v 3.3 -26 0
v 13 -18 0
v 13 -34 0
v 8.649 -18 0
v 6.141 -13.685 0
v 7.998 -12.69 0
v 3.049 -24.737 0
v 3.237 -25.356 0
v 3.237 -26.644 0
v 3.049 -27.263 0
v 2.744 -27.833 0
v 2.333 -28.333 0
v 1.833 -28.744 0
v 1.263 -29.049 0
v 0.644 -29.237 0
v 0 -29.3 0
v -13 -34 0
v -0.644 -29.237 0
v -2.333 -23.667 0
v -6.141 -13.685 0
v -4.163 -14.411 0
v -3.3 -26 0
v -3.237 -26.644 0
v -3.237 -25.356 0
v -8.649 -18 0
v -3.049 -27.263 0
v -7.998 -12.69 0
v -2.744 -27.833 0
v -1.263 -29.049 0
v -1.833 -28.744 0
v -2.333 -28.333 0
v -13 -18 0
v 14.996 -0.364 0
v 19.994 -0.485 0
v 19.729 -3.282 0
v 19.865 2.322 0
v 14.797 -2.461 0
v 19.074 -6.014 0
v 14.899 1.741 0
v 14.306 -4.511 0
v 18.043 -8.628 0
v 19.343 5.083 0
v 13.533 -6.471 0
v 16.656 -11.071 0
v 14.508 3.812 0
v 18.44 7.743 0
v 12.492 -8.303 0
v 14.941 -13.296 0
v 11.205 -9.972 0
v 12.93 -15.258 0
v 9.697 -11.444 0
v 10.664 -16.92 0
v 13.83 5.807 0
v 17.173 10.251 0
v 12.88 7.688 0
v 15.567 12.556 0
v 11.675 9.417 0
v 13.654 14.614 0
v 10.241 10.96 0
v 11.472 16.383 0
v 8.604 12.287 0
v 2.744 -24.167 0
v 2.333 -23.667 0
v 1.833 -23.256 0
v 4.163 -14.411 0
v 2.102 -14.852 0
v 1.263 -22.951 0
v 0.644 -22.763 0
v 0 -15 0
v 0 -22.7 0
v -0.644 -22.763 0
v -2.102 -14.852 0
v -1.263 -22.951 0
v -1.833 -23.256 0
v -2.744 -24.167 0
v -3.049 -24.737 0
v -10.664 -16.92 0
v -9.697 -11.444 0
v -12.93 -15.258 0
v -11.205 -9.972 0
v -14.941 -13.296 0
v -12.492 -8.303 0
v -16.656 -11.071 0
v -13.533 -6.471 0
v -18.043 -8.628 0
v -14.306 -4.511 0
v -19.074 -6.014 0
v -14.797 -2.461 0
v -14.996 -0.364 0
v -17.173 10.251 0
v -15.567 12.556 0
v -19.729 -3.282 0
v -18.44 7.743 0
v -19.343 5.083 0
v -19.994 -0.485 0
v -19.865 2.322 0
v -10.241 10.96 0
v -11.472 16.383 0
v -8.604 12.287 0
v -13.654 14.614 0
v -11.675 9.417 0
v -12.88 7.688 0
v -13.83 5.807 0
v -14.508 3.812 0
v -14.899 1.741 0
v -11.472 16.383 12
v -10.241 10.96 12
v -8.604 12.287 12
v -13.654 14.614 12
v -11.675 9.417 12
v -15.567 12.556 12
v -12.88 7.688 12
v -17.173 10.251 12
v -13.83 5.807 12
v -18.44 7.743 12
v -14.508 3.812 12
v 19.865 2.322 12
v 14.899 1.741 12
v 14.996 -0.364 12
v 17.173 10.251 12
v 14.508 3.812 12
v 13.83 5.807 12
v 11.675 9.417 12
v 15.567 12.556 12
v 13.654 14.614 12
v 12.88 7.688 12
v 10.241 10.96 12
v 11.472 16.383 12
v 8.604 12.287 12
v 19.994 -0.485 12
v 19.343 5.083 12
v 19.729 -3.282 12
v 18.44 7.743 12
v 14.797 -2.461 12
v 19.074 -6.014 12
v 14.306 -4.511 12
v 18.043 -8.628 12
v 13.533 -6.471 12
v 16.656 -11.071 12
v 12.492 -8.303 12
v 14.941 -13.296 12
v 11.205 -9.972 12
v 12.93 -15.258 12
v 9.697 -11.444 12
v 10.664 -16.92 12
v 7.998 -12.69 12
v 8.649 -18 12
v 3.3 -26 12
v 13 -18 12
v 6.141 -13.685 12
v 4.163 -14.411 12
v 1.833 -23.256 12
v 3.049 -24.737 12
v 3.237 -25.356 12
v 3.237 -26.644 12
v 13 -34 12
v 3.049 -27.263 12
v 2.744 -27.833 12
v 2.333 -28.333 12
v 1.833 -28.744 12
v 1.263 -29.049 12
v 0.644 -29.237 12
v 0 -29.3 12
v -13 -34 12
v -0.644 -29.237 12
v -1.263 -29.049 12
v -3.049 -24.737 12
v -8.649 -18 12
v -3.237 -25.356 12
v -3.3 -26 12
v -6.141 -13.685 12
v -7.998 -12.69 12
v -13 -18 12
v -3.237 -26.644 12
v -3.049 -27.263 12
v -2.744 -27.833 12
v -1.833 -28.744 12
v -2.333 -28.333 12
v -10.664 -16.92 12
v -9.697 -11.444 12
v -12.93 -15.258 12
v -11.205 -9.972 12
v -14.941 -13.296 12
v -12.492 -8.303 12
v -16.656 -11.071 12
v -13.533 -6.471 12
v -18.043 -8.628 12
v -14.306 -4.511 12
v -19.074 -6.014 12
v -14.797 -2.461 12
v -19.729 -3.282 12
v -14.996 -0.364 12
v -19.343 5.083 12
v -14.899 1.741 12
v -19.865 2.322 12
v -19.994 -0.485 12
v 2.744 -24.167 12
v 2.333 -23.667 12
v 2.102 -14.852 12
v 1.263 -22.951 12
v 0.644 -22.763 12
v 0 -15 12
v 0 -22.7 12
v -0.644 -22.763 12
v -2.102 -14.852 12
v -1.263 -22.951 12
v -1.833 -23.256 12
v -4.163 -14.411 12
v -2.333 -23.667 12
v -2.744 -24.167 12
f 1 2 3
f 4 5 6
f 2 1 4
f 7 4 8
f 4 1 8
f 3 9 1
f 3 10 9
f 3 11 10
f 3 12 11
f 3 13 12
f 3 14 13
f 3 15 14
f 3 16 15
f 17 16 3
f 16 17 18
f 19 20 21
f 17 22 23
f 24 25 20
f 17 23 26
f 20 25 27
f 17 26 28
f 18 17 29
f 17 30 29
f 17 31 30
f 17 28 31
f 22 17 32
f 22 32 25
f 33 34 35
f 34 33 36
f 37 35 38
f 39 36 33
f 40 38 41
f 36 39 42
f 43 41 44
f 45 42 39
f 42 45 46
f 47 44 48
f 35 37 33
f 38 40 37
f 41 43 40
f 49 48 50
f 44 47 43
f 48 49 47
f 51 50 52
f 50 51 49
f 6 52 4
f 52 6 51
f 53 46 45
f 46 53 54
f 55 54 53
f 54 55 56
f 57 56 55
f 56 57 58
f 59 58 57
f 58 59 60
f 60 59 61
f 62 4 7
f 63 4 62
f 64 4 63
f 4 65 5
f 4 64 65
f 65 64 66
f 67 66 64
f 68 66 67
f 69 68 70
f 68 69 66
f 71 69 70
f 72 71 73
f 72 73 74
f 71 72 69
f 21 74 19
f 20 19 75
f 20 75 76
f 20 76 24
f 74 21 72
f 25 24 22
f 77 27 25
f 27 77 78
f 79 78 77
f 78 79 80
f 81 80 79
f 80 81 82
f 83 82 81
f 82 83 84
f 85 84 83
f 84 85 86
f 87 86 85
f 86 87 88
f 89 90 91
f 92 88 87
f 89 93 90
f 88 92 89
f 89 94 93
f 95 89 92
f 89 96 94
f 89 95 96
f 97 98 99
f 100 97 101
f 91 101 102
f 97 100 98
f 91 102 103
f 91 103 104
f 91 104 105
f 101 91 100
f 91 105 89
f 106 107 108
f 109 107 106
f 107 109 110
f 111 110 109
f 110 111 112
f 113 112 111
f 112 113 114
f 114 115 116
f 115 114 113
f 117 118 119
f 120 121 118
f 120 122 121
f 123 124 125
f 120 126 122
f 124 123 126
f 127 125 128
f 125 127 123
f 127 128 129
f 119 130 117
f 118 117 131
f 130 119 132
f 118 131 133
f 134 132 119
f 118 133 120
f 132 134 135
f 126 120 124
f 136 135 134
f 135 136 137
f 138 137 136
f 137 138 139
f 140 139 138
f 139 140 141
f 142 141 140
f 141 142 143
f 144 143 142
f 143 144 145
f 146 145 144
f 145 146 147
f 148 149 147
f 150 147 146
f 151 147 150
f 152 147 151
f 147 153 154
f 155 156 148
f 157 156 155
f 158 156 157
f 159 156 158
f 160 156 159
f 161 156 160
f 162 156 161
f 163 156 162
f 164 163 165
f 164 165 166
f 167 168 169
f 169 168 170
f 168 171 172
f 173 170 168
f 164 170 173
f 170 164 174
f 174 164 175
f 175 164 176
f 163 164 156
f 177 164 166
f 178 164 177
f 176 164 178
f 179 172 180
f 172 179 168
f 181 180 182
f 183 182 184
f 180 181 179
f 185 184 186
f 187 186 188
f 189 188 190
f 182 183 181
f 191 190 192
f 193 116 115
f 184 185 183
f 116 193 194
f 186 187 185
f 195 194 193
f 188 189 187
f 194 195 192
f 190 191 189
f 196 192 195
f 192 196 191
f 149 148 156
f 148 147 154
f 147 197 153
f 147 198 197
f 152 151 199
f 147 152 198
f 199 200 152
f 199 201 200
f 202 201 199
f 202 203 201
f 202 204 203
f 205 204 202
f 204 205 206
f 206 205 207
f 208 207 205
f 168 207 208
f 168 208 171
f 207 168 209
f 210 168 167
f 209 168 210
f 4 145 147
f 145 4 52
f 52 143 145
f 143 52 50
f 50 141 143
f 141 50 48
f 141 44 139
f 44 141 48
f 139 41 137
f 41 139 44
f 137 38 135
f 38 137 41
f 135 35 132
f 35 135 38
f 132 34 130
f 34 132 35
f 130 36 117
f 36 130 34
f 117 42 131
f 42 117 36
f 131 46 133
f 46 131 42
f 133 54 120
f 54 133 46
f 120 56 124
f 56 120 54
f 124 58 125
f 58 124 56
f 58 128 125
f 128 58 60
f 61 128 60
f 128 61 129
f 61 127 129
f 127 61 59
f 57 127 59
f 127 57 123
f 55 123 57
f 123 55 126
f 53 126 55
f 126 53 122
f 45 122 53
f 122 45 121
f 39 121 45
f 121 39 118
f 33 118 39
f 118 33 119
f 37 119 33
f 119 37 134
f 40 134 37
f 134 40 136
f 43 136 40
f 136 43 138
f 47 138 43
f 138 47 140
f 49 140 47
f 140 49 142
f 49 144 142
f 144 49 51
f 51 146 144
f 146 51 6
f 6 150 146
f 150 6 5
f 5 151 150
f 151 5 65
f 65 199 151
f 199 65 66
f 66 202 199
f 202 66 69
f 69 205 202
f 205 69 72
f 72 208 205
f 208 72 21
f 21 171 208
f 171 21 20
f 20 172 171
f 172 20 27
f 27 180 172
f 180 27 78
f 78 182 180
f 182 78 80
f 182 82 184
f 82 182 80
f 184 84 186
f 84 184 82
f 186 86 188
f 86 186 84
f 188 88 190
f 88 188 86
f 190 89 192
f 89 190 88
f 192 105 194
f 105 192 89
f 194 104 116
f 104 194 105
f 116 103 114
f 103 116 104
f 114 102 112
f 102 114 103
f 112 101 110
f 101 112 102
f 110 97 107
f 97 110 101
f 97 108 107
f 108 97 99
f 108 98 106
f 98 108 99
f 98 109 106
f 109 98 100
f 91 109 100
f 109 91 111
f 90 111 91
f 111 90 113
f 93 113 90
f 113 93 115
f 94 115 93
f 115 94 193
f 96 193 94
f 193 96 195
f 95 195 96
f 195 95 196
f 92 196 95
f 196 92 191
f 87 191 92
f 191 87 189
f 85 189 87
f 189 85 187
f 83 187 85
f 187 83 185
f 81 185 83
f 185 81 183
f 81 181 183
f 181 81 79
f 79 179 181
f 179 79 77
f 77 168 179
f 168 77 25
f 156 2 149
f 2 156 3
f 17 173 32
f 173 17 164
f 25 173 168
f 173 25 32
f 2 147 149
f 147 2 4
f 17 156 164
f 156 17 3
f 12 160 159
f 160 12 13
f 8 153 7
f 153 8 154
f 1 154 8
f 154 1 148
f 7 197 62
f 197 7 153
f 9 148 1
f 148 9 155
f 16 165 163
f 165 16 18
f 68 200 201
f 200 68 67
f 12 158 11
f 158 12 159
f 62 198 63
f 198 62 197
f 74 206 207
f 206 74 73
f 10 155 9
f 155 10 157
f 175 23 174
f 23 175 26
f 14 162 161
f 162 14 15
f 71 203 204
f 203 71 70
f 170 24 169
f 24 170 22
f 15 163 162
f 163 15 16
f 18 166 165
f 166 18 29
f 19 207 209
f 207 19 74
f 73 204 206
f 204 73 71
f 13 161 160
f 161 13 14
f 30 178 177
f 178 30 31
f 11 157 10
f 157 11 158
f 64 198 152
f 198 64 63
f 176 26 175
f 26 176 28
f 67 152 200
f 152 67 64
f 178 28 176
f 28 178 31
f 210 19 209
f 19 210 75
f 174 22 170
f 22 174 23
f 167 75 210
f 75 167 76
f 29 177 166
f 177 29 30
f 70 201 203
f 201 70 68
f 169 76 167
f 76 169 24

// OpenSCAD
$fn = 32;

// ----------------------------------------------------------------------
// Spring clip: 40 mm outside, 5 mm band, 70 degree opening
// ----------------------------------------------------------------------

// --- parameters (mm) ---
outer_r = 20;             // clip outside radius
inner_r = 15;             // clip bore radius
band = 5;                 // band thickness
clip_w = 12;              // clip width
opening = 70;             // opening angle
tab_w = 26;               // tab width
tab_len = 14;             // tab length past the clip
tab_hole = 6.6;           // tab fixing hole

clip_profile = [[-11.472, 16.383], [-13.654, 14.614], [-15.567, 12.556], [-17.173, 10.251], [-18.44, 7.743], [-19.343, 5.083], [-19.865, 2.322], [-19.994, -0.485], [-19.729, -3.282], [-19.074, -6.014], [-18.043, -8.628], [-16.656, -11.071], [-14.941, -13.296], [-12.93, -15.258], [-10.664, -16.92], [-8.188, -18.247], [-5.55, -19.215], [-2.803, -19.803], [0, -20], [2.803, -19.803], [5.55, -19.215], [8.188, -18.247], [10.664, -16.92], [12.93, -15.258], [14.941, -13.296], [16.656, -11.071], [18.043, -8.628], [19.074, -6.014], [19.729, -3.282], [19.994, -0.485], [19.865, 2.322], [19.343, 5.083], [18.44, 7.743], [17.173, 10.251], [15.567, 12.556], [13.654, 14.614], [11.472, 16.383], [8.604, 12.287], [10.241, 10.96], [11.675, 9.417], [12.88, 7.688], [13.83, 5.807], [14.508, 3.812], [14.899, 1.741], [14.996, -0.364], [14.797, -2.461], [14.306, -4.511], [13.533, -6.471], [12.492, -8.303], [11.205, -9.972], [9.697, -11.444], [7.998, -12.69], [6.141, -13.685], [4.163, -14.411], [2.102, -14.852], [0, -15], [-2.102, -14.852], [-4.163, -14.411], [-6.141, -13.685], [-7.998, -12.69], [-9.697, -11.444], [-11.205, -9.972], [-12.492, -8.303], [-13.533, -6.471], [-14.306, -4.511], [-14.797, -2.461], [-14.996, -0.364], [-14.899, 1.741], [-14.508, 3.812], [-13.83, 5.807], [-12.88, 7.688], [-11.675, 9.417], [-10.241, 10.96], [-8.604, 12.287]];

difference() {
  union() {
    linear_extrude(height = clip_w) polygon(clip_profile);
    /* mounting tab, sunk 2 mm into the band */
    translate([-13, -34, 0]) cube([tab_w, 16, clip_w]);
  }
  translate([0, -26, -2.5]) cylinder(h = clip_w + 5, d = tab_hole);
}
